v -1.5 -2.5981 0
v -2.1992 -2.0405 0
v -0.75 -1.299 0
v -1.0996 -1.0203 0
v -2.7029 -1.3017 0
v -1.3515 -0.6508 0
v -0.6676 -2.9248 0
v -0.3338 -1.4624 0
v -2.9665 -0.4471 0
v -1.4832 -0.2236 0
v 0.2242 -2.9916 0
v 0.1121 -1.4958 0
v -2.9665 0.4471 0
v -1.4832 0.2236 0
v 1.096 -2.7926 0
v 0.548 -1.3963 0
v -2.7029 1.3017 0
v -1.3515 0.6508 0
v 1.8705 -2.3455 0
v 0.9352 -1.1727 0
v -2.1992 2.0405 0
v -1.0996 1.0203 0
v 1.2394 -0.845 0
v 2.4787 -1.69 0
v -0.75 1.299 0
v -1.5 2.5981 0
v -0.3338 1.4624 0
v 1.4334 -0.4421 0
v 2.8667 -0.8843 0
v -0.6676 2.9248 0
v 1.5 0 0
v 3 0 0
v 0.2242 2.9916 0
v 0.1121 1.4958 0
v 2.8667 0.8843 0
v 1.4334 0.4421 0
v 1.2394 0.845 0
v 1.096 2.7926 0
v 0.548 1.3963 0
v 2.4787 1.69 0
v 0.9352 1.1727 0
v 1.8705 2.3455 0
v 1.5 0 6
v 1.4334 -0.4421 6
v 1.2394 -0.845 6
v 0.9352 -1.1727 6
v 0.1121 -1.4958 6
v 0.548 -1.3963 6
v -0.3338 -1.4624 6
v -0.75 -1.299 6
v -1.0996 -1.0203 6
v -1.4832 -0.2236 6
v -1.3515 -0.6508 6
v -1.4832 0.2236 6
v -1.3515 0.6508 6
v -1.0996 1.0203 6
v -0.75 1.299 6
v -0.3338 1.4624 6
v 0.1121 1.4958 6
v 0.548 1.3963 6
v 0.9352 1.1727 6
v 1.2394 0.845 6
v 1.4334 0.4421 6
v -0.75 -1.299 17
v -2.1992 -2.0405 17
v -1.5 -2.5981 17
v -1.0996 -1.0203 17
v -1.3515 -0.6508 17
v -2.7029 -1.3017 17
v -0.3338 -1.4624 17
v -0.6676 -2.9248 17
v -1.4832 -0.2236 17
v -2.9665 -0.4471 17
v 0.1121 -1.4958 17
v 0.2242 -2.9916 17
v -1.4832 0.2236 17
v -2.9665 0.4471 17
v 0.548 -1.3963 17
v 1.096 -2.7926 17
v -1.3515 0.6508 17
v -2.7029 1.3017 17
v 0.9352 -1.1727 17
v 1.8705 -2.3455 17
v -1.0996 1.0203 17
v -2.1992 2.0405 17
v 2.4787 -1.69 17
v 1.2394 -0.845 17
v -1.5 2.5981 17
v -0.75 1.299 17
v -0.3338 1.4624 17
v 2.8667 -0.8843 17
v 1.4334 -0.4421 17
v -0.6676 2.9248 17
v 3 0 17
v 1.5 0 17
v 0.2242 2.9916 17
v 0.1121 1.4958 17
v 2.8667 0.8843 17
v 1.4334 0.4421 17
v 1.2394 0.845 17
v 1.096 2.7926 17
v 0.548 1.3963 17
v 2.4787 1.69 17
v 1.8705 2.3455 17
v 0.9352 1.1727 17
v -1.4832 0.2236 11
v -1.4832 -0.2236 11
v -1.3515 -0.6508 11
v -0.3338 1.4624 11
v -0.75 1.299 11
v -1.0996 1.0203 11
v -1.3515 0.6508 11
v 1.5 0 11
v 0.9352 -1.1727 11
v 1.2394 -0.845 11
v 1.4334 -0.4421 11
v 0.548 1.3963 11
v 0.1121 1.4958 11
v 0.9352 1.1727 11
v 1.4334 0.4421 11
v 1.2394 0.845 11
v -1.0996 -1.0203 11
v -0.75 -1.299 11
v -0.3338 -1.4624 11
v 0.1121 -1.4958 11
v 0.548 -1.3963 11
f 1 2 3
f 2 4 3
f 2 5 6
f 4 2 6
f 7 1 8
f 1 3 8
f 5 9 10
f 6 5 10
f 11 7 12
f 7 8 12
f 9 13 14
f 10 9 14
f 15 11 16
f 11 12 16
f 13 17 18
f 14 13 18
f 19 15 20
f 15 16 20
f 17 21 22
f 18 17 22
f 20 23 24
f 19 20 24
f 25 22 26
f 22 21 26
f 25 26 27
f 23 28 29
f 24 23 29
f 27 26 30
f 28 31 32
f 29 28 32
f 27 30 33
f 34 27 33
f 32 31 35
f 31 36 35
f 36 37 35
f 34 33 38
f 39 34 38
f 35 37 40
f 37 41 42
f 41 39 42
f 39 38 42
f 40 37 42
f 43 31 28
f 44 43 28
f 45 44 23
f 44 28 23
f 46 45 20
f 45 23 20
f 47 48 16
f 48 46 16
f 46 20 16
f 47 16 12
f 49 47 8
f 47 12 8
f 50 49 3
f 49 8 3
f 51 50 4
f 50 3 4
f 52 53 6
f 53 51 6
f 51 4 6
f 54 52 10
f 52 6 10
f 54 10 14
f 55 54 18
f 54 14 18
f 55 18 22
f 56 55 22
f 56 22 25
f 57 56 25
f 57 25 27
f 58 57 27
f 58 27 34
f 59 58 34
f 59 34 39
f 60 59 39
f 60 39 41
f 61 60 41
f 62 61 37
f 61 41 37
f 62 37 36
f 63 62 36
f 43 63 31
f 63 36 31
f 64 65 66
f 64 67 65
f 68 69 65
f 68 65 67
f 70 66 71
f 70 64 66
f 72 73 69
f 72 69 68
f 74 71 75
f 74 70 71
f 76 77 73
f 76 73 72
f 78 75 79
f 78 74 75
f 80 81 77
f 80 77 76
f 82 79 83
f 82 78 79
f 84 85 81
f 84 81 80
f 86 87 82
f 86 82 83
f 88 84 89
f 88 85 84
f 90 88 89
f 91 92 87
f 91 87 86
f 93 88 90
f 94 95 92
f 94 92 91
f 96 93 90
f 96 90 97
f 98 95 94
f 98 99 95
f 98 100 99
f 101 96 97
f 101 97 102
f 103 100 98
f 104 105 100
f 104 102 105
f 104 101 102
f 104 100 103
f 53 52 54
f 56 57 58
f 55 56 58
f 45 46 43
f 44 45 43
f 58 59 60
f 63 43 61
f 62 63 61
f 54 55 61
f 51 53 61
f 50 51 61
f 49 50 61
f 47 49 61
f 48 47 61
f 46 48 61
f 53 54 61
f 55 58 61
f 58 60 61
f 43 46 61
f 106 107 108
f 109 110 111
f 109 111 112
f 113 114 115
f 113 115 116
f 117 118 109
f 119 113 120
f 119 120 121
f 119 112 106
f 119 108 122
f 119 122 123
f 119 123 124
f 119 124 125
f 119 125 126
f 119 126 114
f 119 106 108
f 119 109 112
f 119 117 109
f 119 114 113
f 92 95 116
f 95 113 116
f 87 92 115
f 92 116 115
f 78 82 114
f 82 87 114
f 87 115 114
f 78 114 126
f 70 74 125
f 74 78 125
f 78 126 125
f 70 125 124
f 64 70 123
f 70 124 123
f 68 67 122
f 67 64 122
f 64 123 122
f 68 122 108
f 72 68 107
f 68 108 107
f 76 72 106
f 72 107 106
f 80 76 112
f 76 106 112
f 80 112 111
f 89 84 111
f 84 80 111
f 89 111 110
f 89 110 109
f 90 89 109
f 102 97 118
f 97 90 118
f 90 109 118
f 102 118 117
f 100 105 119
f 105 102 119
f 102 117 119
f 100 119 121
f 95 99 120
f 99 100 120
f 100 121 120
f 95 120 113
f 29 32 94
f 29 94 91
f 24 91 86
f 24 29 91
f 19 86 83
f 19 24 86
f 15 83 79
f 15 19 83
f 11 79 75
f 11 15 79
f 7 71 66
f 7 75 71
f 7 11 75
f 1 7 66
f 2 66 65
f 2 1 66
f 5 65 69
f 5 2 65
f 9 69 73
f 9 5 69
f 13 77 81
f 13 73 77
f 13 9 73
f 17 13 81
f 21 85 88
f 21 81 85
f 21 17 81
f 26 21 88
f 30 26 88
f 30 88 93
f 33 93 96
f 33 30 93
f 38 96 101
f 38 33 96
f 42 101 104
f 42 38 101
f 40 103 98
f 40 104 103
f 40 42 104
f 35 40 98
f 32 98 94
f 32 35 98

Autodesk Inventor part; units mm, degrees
ref_plane "YZ Plane" through (0, 0, 0) normal (1, 0, 0) x (0, 1, 0)
ref_plane "XZ Plane" through (0, 0, 0) normal (0, 1, 0) x (-1, 0, 0)
sketch "スケッチ1" plane through (0, 0, 0) normal (0, 0, 1) x (1, 0, 0)
  circle A0 centre (0, 0) radius 3
  circle A1 centre (0, 0) radius 1.5
  dimension "d0" = 6
  dimension "d1" = 3
extrude "押し出し1" add sketch "スケッチ1" along normal blind 17
ref_plane "作業平面1" through (0, 0, 11) normal (0, 0, 1) x (1, 0, 0)
sketch "スケッチ2" plane through (0, 0, 11) normal (0, 0, 1) x (1, 0, 0)
  circle A0 centre (0, 0) radius 1.5 projected
  circle A1 centre (0, 0) radius 3 projected
extrude "押し出し2" add sketch "スケッチ2" against normal blind 5 contours A0
properties part number "スペーサーm3-17　簡易筒型" material "アルミニウム 2014-T4"
